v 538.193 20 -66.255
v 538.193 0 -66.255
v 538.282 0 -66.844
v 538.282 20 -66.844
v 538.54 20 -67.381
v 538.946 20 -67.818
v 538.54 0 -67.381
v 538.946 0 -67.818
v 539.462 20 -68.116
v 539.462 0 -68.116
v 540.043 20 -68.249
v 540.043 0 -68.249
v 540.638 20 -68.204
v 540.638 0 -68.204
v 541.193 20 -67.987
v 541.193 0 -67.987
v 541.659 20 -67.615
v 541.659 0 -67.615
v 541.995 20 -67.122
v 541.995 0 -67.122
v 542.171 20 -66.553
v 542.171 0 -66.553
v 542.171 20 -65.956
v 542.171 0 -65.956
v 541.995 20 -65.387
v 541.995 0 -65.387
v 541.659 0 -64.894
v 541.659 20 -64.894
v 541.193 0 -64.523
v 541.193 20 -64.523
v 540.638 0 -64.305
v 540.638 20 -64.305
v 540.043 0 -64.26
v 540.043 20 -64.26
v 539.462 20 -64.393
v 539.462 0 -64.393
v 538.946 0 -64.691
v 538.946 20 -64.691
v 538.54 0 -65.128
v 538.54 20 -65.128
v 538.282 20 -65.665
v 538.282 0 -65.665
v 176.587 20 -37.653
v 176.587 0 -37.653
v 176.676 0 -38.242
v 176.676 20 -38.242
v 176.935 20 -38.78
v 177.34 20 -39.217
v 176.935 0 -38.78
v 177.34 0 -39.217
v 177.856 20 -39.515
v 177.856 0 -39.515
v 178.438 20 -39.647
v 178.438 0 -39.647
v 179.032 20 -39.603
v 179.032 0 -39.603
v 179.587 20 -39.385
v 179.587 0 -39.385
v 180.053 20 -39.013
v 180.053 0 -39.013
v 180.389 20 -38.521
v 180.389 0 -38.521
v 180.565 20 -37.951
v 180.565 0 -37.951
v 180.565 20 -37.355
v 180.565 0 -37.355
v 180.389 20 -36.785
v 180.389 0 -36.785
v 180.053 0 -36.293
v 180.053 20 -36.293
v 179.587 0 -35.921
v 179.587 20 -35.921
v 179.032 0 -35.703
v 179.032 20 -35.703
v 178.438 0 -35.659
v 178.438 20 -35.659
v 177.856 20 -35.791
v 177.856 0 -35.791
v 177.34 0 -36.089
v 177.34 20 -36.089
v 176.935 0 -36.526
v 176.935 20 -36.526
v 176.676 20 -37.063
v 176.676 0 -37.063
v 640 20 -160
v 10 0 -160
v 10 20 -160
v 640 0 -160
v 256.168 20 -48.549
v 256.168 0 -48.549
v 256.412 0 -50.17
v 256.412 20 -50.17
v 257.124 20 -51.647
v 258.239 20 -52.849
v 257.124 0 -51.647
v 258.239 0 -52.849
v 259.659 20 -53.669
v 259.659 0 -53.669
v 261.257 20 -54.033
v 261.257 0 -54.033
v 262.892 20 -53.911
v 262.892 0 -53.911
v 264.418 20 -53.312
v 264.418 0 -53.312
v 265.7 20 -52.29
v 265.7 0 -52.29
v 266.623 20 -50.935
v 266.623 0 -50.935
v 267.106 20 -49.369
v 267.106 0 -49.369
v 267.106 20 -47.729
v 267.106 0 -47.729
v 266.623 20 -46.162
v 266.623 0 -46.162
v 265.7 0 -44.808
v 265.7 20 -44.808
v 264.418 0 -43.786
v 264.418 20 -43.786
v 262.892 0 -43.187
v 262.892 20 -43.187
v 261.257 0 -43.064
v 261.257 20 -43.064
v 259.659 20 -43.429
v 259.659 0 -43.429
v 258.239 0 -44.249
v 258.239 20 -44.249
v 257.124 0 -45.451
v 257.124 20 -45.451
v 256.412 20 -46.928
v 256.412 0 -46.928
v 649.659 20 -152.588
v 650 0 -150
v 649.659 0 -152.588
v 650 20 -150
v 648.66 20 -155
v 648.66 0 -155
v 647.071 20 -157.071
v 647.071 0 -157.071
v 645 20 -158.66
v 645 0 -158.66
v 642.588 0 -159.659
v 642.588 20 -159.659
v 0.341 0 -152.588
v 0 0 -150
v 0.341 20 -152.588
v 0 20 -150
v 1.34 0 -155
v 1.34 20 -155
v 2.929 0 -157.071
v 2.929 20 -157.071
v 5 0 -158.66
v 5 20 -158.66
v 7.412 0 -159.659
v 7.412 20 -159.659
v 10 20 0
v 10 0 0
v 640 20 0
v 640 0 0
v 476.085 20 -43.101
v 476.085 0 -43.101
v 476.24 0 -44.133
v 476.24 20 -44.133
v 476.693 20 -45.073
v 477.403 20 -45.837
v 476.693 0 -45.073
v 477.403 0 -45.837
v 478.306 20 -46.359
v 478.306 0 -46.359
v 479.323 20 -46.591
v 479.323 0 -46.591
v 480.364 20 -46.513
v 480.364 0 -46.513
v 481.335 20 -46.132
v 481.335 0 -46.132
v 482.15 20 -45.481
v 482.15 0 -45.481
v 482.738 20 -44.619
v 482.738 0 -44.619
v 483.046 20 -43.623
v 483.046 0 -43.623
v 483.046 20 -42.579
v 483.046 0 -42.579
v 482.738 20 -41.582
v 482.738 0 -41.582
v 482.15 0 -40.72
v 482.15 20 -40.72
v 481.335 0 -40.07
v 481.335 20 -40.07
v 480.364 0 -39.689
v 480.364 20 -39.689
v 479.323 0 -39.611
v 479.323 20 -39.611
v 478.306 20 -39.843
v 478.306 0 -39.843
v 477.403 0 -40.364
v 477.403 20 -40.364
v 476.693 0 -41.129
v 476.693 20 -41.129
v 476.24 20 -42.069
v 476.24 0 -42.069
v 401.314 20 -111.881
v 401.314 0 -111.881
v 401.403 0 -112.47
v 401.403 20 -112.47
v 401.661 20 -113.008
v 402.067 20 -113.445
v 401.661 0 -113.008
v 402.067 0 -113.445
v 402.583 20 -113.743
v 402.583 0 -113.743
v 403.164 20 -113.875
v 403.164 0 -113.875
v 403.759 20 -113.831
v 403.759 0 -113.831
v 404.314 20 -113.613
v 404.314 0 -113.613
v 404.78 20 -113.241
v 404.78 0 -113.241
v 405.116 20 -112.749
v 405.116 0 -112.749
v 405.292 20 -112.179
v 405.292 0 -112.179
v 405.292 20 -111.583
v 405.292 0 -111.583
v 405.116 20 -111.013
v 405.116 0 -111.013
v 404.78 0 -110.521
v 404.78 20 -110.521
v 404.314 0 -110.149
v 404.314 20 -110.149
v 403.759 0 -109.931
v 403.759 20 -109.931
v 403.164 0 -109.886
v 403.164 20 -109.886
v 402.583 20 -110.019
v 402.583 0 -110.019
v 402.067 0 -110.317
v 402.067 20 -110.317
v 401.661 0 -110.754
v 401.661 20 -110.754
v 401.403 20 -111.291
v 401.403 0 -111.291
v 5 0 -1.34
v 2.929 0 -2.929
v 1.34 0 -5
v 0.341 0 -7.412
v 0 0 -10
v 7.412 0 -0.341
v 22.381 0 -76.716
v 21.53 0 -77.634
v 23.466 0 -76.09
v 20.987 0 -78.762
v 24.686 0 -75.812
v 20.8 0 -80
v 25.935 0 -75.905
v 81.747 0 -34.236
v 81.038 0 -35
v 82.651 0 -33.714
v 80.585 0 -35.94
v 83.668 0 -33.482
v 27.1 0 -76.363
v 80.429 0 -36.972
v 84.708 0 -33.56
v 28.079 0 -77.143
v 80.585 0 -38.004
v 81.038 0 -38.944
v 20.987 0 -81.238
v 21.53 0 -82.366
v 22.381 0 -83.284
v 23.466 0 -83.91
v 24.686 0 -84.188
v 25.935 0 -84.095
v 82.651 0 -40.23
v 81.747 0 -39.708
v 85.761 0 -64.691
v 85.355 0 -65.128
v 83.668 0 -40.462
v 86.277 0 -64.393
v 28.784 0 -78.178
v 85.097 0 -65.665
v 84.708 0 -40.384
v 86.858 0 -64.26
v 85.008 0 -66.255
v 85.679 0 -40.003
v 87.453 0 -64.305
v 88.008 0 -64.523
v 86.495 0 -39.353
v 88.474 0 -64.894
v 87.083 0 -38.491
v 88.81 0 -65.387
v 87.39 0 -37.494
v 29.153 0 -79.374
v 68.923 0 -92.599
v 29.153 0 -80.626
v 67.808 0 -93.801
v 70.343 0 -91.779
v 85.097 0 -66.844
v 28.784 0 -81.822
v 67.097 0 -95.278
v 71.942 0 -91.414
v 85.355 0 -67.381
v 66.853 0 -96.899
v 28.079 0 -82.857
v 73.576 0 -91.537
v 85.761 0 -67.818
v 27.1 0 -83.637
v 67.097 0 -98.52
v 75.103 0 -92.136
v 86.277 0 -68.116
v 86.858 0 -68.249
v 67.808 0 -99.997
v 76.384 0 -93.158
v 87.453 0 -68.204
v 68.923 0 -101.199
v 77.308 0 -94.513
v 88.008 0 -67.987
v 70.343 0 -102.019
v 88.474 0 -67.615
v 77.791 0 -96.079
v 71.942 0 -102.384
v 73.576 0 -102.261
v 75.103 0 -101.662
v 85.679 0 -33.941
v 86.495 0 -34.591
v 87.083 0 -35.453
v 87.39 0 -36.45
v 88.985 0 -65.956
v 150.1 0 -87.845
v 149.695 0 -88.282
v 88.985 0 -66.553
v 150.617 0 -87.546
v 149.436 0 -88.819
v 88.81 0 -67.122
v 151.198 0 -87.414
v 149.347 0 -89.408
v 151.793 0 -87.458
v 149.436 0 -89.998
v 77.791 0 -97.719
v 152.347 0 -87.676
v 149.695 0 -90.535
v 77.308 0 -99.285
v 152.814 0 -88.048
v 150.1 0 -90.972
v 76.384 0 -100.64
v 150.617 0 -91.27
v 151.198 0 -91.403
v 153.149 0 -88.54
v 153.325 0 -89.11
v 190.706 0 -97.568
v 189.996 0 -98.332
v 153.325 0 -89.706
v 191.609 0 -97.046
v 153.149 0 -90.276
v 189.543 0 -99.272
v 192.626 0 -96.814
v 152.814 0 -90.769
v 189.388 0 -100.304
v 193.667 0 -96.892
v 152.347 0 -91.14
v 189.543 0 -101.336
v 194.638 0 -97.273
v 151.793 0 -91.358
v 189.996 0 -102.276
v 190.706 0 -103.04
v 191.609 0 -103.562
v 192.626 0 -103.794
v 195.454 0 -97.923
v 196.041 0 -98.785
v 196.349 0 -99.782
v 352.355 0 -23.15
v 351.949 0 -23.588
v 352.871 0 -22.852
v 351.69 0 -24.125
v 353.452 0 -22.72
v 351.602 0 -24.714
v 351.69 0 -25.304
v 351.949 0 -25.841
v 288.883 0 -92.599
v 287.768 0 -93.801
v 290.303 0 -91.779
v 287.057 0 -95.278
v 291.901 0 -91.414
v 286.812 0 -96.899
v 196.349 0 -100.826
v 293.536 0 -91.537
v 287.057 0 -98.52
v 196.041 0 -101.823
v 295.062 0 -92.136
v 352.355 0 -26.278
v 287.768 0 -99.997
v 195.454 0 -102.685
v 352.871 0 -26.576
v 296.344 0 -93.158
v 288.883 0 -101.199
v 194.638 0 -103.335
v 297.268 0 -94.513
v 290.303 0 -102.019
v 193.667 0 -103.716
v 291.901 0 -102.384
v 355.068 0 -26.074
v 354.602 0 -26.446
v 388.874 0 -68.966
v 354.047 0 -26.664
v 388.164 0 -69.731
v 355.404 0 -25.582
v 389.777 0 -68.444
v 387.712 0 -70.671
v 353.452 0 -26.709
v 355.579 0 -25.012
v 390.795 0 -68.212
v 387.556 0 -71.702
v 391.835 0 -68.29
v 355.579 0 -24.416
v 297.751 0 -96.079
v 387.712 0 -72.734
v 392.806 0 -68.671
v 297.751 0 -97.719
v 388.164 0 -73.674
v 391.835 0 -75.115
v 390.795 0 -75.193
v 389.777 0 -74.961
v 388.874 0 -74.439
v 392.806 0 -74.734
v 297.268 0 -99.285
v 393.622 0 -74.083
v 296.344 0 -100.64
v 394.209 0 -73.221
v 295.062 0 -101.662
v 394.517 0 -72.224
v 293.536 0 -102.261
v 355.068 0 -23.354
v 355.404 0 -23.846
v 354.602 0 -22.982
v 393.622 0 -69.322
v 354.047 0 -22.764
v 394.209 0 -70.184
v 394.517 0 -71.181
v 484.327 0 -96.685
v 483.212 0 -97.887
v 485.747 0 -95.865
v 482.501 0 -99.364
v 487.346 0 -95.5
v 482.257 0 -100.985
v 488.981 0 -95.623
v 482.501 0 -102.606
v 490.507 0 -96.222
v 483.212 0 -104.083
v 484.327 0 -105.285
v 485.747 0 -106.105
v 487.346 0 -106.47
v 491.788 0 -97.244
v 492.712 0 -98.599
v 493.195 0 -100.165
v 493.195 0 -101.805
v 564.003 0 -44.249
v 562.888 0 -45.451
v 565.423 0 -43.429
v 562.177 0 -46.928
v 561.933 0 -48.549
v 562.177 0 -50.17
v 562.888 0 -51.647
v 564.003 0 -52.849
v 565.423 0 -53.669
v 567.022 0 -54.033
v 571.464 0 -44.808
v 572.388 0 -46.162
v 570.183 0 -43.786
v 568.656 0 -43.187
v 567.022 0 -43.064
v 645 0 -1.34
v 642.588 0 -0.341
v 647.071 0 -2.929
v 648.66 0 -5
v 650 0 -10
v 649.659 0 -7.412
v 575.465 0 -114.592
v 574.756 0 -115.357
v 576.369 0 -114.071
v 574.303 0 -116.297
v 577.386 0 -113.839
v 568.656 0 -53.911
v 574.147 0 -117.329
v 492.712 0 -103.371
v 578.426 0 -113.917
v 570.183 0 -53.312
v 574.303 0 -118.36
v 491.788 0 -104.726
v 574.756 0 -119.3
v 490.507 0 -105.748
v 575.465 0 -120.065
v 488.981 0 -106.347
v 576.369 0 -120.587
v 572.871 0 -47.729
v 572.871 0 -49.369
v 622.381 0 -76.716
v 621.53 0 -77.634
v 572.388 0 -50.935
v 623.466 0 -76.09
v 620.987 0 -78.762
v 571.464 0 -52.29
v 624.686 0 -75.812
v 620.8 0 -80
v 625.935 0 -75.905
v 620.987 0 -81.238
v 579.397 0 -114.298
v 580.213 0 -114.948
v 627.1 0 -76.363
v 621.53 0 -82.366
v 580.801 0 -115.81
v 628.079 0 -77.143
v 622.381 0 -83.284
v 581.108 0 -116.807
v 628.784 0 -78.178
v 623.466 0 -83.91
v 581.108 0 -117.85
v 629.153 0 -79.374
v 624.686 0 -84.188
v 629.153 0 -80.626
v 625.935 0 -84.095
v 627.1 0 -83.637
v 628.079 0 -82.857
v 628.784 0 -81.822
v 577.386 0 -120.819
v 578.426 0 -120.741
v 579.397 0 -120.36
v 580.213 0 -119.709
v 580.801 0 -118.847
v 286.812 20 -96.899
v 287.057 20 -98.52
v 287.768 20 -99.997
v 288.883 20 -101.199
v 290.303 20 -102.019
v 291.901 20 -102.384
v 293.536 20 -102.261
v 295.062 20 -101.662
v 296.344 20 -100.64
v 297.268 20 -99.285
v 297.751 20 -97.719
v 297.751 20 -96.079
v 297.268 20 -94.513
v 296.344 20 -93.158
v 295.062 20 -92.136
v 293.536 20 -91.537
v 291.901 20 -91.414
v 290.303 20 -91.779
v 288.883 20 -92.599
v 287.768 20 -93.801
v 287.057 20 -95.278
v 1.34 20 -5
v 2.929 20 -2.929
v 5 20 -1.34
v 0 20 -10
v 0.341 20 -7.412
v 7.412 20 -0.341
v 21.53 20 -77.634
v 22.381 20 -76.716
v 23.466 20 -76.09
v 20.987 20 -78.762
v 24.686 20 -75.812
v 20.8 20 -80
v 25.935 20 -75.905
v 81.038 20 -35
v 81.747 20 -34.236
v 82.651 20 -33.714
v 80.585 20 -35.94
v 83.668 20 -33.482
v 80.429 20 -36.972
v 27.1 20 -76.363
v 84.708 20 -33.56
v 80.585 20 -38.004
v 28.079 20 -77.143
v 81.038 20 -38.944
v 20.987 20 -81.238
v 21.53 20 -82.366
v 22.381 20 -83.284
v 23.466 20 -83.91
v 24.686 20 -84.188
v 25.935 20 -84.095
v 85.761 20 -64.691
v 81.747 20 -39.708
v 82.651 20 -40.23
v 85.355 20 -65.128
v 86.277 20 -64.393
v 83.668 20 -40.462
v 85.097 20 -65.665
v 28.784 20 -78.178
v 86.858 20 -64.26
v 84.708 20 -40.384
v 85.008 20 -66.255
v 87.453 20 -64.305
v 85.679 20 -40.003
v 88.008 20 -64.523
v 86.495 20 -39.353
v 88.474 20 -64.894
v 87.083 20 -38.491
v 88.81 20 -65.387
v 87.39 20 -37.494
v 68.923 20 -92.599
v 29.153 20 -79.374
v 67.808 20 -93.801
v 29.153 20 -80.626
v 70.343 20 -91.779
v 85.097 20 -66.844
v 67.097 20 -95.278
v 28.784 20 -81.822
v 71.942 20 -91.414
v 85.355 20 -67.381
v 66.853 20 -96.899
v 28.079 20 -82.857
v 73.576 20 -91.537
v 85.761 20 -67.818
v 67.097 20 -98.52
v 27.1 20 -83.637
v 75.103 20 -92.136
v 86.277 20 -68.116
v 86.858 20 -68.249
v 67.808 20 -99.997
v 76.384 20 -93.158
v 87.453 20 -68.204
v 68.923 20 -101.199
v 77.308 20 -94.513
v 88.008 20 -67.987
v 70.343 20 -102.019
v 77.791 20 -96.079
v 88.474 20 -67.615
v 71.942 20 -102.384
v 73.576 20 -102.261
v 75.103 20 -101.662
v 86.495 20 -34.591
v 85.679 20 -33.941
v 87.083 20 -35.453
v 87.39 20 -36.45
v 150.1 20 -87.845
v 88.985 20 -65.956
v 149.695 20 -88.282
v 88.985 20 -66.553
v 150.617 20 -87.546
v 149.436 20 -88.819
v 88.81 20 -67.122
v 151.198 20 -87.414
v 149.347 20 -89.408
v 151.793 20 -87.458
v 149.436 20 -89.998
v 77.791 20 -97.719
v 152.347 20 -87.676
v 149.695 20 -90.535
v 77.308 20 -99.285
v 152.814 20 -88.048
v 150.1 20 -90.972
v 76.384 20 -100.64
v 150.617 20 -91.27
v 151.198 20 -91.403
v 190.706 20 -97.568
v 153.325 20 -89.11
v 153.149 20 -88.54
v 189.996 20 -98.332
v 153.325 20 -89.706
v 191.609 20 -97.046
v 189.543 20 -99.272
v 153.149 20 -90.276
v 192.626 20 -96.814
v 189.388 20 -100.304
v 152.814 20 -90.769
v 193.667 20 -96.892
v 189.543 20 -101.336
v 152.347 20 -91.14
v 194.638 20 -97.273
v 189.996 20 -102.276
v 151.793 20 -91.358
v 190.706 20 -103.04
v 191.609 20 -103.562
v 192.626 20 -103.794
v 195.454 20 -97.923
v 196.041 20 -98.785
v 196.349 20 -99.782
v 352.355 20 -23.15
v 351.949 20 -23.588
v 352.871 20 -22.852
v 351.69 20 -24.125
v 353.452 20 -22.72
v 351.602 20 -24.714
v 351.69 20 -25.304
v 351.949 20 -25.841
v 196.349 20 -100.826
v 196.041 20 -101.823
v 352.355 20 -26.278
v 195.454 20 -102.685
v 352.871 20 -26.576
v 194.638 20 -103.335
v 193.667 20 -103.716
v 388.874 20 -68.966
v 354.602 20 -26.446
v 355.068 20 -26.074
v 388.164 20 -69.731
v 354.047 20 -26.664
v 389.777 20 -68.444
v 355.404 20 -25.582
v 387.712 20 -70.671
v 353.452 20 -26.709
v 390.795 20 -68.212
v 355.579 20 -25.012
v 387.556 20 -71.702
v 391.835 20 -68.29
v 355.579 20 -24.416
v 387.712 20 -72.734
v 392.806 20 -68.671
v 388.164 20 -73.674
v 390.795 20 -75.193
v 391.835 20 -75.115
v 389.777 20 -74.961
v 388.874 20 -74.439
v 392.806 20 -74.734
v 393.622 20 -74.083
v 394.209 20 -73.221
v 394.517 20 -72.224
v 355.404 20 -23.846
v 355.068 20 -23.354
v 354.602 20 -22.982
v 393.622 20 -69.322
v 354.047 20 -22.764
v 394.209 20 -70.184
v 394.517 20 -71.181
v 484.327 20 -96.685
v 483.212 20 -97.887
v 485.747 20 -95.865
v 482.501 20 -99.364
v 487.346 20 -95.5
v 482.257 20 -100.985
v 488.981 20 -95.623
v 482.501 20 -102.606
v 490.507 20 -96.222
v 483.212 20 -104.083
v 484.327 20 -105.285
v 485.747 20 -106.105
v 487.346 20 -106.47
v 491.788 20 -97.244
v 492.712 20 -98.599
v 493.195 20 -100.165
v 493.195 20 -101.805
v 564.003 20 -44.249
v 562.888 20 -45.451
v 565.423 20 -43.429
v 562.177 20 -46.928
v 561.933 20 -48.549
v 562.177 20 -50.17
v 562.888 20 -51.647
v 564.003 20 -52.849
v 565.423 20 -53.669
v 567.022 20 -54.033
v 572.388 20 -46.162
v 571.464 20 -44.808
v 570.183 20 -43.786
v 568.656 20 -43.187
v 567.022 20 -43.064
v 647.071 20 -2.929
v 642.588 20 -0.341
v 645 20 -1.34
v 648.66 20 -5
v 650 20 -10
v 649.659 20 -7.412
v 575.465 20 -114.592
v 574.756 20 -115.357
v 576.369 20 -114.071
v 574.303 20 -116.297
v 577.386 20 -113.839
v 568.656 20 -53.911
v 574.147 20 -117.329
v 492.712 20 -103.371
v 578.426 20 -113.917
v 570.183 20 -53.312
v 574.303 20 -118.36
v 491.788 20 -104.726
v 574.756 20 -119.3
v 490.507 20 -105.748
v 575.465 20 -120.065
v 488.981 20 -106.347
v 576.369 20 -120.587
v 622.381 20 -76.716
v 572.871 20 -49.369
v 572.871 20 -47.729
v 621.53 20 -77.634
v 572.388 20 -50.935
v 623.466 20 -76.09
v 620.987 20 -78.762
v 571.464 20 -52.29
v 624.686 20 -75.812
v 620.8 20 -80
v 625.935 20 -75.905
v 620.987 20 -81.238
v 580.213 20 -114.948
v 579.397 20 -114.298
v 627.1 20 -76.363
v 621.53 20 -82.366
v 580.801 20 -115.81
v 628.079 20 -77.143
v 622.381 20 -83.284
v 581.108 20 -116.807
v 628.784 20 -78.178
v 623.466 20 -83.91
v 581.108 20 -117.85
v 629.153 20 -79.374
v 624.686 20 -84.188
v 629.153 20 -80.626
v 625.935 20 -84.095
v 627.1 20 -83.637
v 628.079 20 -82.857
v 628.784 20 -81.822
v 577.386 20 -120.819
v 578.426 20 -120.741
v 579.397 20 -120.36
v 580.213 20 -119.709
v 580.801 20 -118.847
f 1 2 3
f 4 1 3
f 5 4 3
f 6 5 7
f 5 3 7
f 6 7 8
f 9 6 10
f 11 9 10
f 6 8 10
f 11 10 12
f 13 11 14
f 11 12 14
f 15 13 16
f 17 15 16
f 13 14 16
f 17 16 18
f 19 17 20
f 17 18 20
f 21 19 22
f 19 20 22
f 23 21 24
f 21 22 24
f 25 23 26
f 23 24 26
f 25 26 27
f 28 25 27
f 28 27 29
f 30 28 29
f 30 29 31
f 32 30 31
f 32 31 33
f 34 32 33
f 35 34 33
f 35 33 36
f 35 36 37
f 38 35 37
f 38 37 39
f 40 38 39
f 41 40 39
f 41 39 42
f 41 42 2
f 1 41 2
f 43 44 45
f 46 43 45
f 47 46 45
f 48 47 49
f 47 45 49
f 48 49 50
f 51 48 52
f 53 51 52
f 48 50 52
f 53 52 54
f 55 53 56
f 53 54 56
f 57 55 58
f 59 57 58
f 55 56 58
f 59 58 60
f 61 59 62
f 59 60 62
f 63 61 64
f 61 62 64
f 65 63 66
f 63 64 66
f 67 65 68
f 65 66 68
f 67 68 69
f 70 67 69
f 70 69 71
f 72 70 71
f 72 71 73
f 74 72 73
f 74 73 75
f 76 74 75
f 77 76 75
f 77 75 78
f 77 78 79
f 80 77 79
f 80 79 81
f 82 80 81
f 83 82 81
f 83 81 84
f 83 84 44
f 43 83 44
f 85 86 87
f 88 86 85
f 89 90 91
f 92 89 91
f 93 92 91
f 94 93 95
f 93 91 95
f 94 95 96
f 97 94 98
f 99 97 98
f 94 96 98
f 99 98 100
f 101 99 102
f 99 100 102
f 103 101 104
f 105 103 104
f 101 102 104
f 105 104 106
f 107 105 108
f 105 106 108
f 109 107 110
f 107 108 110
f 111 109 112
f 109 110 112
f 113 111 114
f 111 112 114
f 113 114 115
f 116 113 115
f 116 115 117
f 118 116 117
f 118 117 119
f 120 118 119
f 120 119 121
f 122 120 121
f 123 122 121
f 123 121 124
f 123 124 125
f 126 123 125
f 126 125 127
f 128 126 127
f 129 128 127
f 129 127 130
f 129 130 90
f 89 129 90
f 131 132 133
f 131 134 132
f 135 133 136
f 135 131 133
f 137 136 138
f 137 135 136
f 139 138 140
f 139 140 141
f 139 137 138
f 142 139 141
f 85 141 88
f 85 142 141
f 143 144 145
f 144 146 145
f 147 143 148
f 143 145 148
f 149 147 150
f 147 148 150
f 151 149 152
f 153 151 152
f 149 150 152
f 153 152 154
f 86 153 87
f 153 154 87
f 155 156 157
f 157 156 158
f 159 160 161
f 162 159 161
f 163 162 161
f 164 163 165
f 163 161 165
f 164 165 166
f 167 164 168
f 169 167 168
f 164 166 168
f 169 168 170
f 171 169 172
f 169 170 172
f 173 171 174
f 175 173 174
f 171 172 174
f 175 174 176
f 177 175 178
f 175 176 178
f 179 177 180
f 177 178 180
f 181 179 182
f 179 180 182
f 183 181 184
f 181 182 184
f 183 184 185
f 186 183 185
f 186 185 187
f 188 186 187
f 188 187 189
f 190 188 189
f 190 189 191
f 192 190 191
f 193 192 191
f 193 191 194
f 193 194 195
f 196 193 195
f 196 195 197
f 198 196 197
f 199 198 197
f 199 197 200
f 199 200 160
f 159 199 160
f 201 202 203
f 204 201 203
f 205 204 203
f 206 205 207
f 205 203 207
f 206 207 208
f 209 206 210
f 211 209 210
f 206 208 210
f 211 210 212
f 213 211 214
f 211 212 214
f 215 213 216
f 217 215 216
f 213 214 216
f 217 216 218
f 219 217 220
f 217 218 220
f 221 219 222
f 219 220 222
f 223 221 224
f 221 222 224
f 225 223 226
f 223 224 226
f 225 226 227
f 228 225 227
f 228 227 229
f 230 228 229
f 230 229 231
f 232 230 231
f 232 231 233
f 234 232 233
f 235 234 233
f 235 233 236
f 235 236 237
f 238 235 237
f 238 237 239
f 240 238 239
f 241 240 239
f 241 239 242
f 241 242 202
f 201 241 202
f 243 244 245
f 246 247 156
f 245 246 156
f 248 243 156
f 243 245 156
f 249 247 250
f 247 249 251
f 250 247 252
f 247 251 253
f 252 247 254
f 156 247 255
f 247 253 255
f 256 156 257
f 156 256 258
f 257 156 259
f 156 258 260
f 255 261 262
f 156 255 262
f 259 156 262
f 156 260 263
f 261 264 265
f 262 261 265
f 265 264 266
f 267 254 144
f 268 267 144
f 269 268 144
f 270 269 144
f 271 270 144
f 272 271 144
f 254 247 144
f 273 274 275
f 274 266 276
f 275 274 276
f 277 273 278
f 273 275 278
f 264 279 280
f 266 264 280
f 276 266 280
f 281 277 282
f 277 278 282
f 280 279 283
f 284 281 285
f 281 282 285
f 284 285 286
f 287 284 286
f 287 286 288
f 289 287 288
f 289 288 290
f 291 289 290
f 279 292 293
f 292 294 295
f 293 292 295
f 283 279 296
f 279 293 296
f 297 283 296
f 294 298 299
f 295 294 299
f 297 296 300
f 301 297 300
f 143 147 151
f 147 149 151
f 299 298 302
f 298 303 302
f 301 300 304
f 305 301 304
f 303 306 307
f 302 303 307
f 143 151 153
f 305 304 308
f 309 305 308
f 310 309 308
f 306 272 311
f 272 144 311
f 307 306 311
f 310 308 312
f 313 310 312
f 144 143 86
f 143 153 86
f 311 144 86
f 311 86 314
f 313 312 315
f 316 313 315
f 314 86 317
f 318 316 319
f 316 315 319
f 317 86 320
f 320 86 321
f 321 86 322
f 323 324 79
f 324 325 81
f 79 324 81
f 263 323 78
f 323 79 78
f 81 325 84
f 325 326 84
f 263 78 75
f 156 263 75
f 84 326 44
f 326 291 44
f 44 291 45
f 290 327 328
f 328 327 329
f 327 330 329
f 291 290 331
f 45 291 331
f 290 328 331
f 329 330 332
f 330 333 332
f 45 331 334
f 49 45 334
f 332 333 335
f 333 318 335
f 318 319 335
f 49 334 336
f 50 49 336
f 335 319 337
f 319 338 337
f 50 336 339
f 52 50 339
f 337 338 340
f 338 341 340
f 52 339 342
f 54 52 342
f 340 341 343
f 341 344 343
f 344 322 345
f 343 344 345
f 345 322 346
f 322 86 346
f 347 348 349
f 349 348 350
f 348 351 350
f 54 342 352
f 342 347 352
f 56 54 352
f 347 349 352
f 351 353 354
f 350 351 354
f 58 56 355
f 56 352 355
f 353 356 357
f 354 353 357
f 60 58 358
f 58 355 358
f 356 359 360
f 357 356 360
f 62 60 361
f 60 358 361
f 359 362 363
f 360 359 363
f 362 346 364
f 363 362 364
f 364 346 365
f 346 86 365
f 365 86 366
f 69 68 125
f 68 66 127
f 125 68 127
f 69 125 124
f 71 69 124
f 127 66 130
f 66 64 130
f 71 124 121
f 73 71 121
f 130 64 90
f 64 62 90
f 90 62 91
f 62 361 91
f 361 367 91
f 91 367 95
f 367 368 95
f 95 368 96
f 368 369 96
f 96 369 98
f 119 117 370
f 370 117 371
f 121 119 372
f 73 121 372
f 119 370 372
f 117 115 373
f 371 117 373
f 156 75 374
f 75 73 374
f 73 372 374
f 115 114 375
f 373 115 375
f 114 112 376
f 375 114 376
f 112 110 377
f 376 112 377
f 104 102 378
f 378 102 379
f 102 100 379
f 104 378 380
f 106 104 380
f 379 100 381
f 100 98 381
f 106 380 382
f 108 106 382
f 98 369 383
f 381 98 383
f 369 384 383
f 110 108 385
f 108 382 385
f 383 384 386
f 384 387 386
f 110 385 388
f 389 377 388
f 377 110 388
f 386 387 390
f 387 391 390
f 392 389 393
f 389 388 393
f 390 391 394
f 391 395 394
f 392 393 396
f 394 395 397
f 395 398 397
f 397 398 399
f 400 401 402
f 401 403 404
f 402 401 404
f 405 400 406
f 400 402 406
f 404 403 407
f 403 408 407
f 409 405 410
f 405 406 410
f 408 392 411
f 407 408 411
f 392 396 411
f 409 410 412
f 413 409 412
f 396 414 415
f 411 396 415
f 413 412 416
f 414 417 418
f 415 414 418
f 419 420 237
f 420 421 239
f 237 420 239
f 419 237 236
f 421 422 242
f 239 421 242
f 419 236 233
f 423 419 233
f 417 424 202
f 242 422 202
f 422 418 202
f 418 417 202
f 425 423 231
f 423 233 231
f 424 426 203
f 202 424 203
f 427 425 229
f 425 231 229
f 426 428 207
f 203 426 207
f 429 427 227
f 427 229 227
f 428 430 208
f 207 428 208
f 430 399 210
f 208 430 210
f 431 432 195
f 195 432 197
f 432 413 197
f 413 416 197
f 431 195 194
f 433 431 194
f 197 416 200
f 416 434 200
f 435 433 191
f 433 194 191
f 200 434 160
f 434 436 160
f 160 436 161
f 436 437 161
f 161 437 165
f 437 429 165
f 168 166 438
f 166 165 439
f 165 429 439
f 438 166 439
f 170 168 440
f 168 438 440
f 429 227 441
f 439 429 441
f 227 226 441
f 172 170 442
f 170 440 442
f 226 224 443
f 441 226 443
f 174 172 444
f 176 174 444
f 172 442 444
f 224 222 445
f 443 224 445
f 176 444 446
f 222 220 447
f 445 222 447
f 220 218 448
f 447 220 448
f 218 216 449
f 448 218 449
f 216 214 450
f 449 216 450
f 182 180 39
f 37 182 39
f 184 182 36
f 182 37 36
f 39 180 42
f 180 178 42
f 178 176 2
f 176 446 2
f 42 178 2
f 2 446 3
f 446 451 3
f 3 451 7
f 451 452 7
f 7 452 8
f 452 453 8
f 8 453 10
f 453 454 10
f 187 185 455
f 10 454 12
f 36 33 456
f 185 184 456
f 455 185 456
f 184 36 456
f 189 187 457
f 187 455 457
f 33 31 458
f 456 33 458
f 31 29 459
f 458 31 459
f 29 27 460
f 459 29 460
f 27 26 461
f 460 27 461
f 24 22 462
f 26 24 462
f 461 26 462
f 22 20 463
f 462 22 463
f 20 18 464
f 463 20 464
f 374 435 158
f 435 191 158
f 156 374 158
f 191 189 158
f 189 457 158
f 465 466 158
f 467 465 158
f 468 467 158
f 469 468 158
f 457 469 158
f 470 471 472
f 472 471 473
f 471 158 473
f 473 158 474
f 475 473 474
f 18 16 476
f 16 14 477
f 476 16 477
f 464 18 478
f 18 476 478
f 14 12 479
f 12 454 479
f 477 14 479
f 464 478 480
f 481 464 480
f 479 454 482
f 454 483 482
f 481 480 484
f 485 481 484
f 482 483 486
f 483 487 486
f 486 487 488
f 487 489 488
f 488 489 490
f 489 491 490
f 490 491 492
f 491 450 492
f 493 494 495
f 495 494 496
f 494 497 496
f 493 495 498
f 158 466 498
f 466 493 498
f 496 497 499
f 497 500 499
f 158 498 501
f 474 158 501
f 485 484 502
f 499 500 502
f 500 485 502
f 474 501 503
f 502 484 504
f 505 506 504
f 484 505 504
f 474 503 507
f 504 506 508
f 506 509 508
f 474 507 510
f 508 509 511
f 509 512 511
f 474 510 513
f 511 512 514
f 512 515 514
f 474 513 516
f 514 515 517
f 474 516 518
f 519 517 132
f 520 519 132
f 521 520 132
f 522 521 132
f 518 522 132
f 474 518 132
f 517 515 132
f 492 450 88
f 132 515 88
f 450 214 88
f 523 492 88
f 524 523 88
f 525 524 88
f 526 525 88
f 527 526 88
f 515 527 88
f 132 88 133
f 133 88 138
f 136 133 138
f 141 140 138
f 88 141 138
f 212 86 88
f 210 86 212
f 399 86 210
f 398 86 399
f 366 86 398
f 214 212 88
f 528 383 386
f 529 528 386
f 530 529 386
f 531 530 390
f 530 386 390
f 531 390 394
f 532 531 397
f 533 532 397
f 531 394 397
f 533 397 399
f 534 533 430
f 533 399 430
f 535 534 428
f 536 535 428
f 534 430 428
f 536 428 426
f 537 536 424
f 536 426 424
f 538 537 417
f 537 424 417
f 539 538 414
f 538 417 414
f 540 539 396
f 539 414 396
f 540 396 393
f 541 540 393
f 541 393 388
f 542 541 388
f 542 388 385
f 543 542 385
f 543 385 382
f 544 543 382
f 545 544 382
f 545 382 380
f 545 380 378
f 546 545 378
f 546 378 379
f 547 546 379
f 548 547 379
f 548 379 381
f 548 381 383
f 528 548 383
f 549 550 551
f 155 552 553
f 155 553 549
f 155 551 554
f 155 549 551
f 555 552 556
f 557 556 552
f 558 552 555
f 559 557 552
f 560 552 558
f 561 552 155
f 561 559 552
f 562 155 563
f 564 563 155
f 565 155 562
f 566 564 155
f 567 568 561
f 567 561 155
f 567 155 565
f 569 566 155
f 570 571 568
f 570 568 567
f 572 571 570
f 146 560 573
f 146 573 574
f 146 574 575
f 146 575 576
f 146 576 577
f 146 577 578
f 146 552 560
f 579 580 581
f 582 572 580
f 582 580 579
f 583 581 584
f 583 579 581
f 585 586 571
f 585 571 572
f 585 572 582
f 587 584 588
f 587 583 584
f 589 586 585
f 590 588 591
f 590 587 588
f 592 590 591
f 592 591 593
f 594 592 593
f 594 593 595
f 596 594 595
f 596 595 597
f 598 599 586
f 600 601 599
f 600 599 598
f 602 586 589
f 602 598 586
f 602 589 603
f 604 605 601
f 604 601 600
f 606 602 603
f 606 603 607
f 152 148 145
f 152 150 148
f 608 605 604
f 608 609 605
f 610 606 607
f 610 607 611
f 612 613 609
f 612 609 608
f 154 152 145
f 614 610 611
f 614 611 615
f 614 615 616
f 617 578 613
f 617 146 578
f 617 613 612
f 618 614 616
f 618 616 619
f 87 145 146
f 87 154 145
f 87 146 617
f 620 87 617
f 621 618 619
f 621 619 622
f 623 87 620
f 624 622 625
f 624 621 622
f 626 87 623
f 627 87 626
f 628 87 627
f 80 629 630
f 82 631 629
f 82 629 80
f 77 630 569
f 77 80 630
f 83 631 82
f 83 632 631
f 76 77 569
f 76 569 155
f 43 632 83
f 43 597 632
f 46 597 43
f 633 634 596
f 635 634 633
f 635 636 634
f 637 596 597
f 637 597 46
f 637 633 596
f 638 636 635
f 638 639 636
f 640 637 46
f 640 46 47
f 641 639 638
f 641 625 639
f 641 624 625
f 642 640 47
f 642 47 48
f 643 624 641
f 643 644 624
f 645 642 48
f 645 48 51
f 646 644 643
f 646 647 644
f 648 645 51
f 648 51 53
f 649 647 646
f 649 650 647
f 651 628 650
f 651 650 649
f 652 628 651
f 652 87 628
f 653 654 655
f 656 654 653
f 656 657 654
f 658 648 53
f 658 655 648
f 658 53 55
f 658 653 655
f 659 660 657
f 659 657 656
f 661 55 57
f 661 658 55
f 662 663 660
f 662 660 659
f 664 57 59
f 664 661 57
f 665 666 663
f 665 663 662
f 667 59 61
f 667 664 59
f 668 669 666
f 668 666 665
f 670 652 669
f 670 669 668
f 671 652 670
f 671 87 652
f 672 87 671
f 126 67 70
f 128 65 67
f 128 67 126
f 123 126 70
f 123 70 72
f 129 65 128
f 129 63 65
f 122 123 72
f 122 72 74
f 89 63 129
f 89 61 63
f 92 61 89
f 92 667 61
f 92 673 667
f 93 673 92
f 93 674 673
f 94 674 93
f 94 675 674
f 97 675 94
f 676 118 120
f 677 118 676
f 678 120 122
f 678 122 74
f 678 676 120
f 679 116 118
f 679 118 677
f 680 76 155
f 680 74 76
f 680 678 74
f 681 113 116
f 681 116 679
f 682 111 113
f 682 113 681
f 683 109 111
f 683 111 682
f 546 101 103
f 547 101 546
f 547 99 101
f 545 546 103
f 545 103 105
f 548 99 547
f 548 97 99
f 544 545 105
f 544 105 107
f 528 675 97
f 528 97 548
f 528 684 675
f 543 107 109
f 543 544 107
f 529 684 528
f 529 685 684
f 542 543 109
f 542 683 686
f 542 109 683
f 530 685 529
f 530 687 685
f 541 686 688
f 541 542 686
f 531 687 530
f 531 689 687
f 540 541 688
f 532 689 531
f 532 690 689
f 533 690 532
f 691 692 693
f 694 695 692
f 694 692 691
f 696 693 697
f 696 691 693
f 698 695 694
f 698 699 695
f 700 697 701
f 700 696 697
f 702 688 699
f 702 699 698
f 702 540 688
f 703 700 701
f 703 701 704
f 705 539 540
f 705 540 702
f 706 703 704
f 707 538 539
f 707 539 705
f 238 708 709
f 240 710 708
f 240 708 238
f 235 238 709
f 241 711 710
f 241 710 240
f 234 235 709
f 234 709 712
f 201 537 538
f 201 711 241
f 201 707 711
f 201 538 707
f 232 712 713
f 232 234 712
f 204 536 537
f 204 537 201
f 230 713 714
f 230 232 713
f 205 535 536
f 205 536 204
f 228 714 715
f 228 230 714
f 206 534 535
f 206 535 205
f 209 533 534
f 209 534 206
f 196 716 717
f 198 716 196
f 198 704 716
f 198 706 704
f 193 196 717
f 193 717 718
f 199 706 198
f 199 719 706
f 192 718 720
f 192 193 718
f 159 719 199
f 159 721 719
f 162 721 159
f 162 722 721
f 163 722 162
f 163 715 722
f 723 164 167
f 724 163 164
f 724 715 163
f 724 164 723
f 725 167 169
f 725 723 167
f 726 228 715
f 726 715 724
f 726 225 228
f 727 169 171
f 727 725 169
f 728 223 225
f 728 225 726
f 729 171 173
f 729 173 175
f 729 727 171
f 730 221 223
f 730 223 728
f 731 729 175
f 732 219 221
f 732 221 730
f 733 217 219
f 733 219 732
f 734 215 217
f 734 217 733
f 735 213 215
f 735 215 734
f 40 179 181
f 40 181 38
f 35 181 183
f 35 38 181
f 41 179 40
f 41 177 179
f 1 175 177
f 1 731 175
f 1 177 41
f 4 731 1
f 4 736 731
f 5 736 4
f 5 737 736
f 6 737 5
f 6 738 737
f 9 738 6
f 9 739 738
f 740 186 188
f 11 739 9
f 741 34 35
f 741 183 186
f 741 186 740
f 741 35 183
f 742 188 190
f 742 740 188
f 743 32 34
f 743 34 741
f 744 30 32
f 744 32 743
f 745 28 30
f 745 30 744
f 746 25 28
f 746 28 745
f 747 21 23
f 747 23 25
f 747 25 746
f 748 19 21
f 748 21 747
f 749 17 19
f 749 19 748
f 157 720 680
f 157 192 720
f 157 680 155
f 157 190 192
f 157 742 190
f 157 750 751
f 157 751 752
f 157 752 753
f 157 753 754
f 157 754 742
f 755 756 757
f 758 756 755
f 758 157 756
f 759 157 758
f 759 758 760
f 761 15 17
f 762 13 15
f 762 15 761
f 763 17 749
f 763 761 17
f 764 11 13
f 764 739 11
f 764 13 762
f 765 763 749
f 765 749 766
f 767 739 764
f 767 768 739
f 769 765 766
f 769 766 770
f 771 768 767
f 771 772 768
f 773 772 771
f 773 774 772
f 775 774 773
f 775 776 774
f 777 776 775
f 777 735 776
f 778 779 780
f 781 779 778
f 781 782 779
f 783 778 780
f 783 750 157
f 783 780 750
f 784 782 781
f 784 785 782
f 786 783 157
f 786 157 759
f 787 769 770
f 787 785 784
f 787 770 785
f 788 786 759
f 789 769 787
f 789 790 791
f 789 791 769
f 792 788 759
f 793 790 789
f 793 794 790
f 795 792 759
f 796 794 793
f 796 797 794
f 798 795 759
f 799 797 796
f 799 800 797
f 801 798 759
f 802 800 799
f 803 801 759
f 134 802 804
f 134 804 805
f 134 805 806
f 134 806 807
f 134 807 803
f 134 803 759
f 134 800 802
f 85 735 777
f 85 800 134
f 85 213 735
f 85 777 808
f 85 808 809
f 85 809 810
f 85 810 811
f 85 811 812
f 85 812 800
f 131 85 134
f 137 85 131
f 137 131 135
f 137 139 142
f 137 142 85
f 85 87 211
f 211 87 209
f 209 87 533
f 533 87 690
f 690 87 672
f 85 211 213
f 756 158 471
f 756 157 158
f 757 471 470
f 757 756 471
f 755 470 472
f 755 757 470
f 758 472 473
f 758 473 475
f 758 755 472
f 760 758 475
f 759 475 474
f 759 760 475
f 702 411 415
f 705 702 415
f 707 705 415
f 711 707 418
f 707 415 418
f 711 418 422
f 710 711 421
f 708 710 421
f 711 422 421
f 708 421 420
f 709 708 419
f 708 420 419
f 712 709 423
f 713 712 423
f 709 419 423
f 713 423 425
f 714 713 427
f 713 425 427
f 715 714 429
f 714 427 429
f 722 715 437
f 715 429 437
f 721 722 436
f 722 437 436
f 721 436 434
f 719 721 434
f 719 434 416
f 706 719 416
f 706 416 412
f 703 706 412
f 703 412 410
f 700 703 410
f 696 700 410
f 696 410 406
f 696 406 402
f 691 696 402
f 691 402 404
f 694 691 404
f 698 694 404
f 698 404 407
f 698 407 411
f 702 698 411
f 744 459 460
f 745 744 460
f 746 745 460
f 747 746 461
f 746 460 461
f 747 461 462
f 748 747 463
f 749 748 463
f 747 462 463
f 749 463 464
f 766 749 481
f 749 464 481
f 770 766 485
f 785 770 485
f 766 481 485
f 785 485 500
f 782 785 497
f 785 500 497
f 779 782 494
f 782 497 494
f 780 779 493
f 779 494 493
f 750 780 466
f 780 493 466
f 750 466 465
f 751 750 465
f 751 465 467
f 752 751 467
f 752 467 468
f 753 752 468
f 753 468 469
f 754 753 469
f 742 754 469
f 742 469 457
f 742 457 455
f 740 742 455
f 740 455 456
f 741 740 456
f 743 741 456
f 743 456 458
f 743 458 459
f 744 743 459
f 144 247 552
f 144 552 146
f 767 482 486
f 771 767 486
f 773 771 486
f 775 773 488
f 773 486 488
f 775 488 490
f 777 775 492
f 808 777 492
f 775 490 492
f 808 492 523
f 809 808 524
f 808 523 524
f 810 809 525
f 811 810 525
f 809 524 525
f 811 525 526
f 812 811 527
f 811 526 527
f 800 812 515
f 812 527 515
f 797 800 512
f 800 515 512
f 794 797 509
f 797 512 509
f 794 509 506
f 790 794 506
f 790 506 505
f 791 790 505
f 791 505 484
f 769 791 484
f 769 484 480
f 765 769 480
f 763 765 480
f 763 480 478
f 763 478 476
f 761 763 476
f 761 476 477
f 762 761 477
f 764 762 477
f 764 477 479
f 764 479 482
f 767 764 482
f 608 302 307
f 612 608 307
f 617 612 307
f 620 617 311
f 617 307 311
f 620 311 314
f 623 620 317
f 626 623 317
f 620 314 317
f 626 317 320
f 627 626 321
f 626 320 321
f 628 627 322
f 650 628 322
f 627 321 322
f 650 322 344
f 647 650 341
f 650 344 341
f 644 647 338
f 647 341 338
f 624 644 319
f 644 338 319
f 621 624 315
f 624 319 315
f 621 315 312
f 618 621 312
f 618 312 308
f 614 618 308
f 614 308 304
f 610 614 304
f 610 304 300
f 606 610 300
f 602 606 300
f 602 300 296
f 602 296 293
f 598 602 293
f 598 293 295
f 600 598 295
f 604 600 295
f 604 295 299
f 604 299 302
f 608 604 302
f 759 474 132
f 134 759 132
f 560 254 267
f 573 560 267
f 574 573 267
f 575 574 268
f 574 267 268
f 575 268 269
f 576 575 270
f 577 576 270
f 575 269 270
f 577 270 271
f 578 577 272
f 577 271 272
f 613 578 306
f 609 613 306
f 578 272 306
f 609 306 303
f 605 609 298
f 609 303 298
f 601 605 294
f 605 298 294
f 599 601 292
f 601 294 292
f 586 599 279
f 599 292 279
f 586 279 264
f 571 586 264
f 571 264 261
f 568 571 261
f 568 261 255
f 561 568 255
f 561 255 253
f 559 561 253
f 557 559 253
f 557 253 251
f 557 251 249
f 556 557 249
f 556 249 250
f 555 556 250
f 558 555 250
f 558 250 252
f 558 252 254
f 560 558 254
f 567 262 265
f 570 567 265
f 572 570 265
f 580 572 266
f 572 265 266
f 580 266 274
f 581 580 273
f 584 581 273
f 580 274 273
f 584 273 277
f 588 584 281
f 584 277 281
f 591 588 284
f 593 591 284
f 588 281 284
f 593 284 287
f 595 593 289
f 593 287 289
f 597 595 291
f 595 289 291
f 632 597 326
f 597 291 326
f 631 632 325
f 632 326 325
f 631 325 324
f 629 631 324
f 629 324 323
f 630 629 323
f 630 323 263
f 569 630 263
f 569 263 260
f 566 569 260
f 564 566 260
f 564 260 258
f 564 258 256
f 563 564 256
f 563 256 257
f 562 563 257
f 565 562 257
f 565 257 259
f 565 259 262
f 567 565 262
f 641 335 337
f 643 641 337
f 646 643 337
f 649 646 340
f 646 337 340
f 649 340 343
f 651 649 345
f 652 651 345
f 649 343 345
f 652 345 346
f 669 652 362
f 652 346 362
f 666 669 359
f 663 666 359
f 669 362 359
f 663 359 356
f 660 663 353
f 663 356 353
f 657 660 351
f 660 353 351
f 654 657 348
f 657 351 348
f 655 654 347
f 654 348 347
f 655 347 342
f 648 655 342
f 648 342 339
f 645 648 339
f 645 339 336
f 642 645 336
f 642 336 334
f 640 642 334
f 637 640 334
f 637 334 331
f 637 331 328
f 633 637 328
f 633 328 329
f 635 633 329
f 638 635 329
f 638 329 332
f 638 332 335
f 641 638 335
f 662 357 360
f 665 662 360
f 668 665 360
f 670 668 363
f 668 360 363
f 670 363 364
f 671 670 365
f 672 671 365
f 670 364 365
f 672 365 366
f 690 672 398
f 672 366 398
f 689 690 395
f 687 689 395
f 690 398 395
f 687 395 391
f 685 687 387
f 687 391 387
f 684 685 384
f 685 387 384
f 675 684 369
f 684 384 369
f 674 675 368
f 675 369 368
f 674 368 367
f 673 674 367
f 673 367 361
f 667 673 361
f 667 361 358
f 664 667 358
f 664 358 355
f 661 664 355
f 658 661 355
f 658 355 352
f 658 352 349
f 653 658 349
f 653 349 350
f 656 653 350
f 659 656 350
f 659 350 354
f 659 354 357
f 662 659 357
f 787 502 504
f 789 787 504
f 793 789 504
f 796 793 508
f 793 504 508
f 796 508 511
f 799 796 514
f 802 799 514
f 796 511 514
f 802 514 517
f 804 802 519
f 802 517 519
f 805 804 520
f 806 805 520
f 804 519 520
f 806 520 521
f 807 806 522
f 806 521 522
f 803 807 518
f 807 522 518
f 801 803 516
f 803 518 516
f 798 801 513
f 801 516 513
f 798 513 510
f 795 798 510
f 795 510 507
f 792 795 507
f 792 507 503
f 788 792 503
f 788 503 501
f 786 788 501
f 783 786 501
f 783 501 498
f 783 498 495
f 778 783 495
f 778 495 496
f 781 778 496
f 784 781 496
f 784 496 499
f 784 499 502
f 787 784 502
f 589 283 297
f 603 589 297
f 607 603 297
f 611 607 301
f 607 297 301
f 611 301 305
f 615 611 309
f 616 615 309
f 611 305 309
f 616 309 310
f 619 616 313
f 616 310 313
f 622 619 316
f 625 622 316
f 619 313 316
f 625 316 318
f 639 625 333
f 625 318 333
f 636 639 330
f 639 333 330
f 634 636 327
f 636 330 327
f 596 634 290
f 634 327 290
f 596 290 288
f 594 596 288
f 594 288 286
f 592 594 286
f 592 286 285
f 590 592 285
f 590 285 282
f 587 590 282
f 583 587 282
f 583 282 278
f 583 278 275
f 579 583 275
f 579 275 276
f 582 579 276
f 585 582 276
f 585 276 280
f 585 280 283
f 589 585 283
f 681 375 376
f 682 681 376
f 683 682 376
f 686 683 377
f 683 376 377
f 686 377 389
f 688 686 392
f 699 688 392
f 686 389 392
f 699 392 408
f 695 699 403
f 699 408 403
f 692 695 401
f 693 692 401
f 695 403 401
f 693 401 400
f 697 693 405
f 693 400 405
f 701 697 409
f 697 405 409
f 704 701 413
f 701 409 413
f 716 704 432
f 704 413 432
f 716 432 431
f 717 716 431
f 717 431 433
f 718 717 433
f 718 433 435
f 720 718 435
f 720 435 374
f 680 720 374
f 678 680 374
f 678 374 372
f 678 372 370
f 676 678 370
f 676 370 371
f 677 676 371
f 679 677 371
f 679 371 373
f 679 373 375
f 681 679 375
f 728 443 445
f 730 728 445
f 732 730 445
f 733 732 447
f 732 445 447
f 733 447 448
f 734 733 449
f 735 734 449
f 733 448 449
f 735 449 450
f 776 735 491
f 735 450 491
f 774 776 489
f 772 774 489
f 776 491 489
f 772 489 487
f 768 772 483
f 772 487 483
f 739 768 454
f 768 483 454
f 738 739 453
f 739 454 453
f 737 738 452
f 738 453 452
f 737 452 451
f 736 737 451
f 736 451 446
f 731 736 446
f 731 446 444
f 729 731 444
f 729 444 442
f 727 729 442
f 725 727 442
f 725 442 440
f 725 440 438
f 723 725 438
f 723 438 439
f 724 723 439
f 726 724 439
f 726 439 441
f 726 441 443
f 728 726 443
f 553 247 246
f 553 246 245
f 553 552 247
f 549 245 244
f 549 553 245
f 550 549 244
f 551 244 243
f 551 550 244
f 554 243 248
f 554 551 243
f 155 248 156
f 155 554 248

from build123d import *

# Parameters (mm, degrees)
SKETCH1_W                  = 650
SKETCH1_H                  = 160
BOSS_EXTRUDE1_DEPTH        = 20
FILLET1_R                  = 10
F_11_0_11_DIAMETER_HOLE1_D = 11
F_7_0_7_DIAMETER_HOLE1_D   = 7
F_4_0_4_DIAMETER_HOLE1_D   = 4
M8_CLEARANCE_HOLE1_D       = 8.4


with BuildPart() as part:
    # Sketch1 → Boss-Extrude1 (new body)
    with BuildSketch(Plane(origin=(0, 0, 0), x_dir=(1, 0, 0), z_dir=(0, 1, 0))):
        with Locations((325, 80)):
            Rectangle(SKETCH1_W, SKETCH1_H)
    extrude(amount=BOSS_EXTRUDE1_DEPTH)

    # Fillet1
    fillet1_edges = [part.edges().sort_by_distance(p)[0] for p in [
        (0, 10, 0),
        (650, 10, 0),
        (650, 10, -160),
        (0, 10, -160),
    ]]
    fillet(fillet1_edges, radius=FILLET1_R)

    # Ø11.0 (11) Diameter Hole1 (through all)
    with Locations(Plane(origin=(0, 20, 0), x_dir=(1, 0, 0), z_dir=(0, 1, 0))):
        with Locations((72.352582635, 96.89911856), (261.667898073, 48.548804186), (487.756692049, 100.98506062), (567.432562216, 48.548804186), (292.312463521, 96.89911856)):
            Hole(F_11_0_11_DIAMETER_HOLE1_D / 2)

    # Ø7.0 (7) Diameter Hole1 (through all)
    with Locations(Plane(origin=(0, 20, 0), x_dir=(1, 0, 0), z_dir=(0, 1, 0))):
        with Locations((192.887873399, 100.304070277), (83.929418471, 36.97196835), (391.0560633, 71.702475858), (577.647417365, 117.32882886), (479.58480793, 43.10088144)):
            Hole(F_7_0_7_DIAMETER_HOLE1_D / 2)

    # Ø4.0 (4) Diameter Hole1 (through all)
    with Locations(Plane(origin=(0, 20, 0), x_dir=(1, 0, 0), z_dir=(0, 1, 0))):
        with Locations((178.58707619, 37.652958693), (151.347462458, 89.408224784), (353.601594419, 24.71414217), (403.31388948, 111.880906113), (540.192948484, 66.254553112), (87.007836042, 66.254553112)):
            Hole(F_4_0_4_DIAMETER_HOLE1_D / 2)

    # M8 Clearance Hole1 (through all)
    with Locations(Plane(origin=(0, 20, 0), x_dir=(1, 0, 0), z_dir=(0, 1, 0))):
        with Locations((625, 80), (25, 80)):
            Hole(M8_CLEARANCE_HOLE1_D / 2)


solid = part.part
